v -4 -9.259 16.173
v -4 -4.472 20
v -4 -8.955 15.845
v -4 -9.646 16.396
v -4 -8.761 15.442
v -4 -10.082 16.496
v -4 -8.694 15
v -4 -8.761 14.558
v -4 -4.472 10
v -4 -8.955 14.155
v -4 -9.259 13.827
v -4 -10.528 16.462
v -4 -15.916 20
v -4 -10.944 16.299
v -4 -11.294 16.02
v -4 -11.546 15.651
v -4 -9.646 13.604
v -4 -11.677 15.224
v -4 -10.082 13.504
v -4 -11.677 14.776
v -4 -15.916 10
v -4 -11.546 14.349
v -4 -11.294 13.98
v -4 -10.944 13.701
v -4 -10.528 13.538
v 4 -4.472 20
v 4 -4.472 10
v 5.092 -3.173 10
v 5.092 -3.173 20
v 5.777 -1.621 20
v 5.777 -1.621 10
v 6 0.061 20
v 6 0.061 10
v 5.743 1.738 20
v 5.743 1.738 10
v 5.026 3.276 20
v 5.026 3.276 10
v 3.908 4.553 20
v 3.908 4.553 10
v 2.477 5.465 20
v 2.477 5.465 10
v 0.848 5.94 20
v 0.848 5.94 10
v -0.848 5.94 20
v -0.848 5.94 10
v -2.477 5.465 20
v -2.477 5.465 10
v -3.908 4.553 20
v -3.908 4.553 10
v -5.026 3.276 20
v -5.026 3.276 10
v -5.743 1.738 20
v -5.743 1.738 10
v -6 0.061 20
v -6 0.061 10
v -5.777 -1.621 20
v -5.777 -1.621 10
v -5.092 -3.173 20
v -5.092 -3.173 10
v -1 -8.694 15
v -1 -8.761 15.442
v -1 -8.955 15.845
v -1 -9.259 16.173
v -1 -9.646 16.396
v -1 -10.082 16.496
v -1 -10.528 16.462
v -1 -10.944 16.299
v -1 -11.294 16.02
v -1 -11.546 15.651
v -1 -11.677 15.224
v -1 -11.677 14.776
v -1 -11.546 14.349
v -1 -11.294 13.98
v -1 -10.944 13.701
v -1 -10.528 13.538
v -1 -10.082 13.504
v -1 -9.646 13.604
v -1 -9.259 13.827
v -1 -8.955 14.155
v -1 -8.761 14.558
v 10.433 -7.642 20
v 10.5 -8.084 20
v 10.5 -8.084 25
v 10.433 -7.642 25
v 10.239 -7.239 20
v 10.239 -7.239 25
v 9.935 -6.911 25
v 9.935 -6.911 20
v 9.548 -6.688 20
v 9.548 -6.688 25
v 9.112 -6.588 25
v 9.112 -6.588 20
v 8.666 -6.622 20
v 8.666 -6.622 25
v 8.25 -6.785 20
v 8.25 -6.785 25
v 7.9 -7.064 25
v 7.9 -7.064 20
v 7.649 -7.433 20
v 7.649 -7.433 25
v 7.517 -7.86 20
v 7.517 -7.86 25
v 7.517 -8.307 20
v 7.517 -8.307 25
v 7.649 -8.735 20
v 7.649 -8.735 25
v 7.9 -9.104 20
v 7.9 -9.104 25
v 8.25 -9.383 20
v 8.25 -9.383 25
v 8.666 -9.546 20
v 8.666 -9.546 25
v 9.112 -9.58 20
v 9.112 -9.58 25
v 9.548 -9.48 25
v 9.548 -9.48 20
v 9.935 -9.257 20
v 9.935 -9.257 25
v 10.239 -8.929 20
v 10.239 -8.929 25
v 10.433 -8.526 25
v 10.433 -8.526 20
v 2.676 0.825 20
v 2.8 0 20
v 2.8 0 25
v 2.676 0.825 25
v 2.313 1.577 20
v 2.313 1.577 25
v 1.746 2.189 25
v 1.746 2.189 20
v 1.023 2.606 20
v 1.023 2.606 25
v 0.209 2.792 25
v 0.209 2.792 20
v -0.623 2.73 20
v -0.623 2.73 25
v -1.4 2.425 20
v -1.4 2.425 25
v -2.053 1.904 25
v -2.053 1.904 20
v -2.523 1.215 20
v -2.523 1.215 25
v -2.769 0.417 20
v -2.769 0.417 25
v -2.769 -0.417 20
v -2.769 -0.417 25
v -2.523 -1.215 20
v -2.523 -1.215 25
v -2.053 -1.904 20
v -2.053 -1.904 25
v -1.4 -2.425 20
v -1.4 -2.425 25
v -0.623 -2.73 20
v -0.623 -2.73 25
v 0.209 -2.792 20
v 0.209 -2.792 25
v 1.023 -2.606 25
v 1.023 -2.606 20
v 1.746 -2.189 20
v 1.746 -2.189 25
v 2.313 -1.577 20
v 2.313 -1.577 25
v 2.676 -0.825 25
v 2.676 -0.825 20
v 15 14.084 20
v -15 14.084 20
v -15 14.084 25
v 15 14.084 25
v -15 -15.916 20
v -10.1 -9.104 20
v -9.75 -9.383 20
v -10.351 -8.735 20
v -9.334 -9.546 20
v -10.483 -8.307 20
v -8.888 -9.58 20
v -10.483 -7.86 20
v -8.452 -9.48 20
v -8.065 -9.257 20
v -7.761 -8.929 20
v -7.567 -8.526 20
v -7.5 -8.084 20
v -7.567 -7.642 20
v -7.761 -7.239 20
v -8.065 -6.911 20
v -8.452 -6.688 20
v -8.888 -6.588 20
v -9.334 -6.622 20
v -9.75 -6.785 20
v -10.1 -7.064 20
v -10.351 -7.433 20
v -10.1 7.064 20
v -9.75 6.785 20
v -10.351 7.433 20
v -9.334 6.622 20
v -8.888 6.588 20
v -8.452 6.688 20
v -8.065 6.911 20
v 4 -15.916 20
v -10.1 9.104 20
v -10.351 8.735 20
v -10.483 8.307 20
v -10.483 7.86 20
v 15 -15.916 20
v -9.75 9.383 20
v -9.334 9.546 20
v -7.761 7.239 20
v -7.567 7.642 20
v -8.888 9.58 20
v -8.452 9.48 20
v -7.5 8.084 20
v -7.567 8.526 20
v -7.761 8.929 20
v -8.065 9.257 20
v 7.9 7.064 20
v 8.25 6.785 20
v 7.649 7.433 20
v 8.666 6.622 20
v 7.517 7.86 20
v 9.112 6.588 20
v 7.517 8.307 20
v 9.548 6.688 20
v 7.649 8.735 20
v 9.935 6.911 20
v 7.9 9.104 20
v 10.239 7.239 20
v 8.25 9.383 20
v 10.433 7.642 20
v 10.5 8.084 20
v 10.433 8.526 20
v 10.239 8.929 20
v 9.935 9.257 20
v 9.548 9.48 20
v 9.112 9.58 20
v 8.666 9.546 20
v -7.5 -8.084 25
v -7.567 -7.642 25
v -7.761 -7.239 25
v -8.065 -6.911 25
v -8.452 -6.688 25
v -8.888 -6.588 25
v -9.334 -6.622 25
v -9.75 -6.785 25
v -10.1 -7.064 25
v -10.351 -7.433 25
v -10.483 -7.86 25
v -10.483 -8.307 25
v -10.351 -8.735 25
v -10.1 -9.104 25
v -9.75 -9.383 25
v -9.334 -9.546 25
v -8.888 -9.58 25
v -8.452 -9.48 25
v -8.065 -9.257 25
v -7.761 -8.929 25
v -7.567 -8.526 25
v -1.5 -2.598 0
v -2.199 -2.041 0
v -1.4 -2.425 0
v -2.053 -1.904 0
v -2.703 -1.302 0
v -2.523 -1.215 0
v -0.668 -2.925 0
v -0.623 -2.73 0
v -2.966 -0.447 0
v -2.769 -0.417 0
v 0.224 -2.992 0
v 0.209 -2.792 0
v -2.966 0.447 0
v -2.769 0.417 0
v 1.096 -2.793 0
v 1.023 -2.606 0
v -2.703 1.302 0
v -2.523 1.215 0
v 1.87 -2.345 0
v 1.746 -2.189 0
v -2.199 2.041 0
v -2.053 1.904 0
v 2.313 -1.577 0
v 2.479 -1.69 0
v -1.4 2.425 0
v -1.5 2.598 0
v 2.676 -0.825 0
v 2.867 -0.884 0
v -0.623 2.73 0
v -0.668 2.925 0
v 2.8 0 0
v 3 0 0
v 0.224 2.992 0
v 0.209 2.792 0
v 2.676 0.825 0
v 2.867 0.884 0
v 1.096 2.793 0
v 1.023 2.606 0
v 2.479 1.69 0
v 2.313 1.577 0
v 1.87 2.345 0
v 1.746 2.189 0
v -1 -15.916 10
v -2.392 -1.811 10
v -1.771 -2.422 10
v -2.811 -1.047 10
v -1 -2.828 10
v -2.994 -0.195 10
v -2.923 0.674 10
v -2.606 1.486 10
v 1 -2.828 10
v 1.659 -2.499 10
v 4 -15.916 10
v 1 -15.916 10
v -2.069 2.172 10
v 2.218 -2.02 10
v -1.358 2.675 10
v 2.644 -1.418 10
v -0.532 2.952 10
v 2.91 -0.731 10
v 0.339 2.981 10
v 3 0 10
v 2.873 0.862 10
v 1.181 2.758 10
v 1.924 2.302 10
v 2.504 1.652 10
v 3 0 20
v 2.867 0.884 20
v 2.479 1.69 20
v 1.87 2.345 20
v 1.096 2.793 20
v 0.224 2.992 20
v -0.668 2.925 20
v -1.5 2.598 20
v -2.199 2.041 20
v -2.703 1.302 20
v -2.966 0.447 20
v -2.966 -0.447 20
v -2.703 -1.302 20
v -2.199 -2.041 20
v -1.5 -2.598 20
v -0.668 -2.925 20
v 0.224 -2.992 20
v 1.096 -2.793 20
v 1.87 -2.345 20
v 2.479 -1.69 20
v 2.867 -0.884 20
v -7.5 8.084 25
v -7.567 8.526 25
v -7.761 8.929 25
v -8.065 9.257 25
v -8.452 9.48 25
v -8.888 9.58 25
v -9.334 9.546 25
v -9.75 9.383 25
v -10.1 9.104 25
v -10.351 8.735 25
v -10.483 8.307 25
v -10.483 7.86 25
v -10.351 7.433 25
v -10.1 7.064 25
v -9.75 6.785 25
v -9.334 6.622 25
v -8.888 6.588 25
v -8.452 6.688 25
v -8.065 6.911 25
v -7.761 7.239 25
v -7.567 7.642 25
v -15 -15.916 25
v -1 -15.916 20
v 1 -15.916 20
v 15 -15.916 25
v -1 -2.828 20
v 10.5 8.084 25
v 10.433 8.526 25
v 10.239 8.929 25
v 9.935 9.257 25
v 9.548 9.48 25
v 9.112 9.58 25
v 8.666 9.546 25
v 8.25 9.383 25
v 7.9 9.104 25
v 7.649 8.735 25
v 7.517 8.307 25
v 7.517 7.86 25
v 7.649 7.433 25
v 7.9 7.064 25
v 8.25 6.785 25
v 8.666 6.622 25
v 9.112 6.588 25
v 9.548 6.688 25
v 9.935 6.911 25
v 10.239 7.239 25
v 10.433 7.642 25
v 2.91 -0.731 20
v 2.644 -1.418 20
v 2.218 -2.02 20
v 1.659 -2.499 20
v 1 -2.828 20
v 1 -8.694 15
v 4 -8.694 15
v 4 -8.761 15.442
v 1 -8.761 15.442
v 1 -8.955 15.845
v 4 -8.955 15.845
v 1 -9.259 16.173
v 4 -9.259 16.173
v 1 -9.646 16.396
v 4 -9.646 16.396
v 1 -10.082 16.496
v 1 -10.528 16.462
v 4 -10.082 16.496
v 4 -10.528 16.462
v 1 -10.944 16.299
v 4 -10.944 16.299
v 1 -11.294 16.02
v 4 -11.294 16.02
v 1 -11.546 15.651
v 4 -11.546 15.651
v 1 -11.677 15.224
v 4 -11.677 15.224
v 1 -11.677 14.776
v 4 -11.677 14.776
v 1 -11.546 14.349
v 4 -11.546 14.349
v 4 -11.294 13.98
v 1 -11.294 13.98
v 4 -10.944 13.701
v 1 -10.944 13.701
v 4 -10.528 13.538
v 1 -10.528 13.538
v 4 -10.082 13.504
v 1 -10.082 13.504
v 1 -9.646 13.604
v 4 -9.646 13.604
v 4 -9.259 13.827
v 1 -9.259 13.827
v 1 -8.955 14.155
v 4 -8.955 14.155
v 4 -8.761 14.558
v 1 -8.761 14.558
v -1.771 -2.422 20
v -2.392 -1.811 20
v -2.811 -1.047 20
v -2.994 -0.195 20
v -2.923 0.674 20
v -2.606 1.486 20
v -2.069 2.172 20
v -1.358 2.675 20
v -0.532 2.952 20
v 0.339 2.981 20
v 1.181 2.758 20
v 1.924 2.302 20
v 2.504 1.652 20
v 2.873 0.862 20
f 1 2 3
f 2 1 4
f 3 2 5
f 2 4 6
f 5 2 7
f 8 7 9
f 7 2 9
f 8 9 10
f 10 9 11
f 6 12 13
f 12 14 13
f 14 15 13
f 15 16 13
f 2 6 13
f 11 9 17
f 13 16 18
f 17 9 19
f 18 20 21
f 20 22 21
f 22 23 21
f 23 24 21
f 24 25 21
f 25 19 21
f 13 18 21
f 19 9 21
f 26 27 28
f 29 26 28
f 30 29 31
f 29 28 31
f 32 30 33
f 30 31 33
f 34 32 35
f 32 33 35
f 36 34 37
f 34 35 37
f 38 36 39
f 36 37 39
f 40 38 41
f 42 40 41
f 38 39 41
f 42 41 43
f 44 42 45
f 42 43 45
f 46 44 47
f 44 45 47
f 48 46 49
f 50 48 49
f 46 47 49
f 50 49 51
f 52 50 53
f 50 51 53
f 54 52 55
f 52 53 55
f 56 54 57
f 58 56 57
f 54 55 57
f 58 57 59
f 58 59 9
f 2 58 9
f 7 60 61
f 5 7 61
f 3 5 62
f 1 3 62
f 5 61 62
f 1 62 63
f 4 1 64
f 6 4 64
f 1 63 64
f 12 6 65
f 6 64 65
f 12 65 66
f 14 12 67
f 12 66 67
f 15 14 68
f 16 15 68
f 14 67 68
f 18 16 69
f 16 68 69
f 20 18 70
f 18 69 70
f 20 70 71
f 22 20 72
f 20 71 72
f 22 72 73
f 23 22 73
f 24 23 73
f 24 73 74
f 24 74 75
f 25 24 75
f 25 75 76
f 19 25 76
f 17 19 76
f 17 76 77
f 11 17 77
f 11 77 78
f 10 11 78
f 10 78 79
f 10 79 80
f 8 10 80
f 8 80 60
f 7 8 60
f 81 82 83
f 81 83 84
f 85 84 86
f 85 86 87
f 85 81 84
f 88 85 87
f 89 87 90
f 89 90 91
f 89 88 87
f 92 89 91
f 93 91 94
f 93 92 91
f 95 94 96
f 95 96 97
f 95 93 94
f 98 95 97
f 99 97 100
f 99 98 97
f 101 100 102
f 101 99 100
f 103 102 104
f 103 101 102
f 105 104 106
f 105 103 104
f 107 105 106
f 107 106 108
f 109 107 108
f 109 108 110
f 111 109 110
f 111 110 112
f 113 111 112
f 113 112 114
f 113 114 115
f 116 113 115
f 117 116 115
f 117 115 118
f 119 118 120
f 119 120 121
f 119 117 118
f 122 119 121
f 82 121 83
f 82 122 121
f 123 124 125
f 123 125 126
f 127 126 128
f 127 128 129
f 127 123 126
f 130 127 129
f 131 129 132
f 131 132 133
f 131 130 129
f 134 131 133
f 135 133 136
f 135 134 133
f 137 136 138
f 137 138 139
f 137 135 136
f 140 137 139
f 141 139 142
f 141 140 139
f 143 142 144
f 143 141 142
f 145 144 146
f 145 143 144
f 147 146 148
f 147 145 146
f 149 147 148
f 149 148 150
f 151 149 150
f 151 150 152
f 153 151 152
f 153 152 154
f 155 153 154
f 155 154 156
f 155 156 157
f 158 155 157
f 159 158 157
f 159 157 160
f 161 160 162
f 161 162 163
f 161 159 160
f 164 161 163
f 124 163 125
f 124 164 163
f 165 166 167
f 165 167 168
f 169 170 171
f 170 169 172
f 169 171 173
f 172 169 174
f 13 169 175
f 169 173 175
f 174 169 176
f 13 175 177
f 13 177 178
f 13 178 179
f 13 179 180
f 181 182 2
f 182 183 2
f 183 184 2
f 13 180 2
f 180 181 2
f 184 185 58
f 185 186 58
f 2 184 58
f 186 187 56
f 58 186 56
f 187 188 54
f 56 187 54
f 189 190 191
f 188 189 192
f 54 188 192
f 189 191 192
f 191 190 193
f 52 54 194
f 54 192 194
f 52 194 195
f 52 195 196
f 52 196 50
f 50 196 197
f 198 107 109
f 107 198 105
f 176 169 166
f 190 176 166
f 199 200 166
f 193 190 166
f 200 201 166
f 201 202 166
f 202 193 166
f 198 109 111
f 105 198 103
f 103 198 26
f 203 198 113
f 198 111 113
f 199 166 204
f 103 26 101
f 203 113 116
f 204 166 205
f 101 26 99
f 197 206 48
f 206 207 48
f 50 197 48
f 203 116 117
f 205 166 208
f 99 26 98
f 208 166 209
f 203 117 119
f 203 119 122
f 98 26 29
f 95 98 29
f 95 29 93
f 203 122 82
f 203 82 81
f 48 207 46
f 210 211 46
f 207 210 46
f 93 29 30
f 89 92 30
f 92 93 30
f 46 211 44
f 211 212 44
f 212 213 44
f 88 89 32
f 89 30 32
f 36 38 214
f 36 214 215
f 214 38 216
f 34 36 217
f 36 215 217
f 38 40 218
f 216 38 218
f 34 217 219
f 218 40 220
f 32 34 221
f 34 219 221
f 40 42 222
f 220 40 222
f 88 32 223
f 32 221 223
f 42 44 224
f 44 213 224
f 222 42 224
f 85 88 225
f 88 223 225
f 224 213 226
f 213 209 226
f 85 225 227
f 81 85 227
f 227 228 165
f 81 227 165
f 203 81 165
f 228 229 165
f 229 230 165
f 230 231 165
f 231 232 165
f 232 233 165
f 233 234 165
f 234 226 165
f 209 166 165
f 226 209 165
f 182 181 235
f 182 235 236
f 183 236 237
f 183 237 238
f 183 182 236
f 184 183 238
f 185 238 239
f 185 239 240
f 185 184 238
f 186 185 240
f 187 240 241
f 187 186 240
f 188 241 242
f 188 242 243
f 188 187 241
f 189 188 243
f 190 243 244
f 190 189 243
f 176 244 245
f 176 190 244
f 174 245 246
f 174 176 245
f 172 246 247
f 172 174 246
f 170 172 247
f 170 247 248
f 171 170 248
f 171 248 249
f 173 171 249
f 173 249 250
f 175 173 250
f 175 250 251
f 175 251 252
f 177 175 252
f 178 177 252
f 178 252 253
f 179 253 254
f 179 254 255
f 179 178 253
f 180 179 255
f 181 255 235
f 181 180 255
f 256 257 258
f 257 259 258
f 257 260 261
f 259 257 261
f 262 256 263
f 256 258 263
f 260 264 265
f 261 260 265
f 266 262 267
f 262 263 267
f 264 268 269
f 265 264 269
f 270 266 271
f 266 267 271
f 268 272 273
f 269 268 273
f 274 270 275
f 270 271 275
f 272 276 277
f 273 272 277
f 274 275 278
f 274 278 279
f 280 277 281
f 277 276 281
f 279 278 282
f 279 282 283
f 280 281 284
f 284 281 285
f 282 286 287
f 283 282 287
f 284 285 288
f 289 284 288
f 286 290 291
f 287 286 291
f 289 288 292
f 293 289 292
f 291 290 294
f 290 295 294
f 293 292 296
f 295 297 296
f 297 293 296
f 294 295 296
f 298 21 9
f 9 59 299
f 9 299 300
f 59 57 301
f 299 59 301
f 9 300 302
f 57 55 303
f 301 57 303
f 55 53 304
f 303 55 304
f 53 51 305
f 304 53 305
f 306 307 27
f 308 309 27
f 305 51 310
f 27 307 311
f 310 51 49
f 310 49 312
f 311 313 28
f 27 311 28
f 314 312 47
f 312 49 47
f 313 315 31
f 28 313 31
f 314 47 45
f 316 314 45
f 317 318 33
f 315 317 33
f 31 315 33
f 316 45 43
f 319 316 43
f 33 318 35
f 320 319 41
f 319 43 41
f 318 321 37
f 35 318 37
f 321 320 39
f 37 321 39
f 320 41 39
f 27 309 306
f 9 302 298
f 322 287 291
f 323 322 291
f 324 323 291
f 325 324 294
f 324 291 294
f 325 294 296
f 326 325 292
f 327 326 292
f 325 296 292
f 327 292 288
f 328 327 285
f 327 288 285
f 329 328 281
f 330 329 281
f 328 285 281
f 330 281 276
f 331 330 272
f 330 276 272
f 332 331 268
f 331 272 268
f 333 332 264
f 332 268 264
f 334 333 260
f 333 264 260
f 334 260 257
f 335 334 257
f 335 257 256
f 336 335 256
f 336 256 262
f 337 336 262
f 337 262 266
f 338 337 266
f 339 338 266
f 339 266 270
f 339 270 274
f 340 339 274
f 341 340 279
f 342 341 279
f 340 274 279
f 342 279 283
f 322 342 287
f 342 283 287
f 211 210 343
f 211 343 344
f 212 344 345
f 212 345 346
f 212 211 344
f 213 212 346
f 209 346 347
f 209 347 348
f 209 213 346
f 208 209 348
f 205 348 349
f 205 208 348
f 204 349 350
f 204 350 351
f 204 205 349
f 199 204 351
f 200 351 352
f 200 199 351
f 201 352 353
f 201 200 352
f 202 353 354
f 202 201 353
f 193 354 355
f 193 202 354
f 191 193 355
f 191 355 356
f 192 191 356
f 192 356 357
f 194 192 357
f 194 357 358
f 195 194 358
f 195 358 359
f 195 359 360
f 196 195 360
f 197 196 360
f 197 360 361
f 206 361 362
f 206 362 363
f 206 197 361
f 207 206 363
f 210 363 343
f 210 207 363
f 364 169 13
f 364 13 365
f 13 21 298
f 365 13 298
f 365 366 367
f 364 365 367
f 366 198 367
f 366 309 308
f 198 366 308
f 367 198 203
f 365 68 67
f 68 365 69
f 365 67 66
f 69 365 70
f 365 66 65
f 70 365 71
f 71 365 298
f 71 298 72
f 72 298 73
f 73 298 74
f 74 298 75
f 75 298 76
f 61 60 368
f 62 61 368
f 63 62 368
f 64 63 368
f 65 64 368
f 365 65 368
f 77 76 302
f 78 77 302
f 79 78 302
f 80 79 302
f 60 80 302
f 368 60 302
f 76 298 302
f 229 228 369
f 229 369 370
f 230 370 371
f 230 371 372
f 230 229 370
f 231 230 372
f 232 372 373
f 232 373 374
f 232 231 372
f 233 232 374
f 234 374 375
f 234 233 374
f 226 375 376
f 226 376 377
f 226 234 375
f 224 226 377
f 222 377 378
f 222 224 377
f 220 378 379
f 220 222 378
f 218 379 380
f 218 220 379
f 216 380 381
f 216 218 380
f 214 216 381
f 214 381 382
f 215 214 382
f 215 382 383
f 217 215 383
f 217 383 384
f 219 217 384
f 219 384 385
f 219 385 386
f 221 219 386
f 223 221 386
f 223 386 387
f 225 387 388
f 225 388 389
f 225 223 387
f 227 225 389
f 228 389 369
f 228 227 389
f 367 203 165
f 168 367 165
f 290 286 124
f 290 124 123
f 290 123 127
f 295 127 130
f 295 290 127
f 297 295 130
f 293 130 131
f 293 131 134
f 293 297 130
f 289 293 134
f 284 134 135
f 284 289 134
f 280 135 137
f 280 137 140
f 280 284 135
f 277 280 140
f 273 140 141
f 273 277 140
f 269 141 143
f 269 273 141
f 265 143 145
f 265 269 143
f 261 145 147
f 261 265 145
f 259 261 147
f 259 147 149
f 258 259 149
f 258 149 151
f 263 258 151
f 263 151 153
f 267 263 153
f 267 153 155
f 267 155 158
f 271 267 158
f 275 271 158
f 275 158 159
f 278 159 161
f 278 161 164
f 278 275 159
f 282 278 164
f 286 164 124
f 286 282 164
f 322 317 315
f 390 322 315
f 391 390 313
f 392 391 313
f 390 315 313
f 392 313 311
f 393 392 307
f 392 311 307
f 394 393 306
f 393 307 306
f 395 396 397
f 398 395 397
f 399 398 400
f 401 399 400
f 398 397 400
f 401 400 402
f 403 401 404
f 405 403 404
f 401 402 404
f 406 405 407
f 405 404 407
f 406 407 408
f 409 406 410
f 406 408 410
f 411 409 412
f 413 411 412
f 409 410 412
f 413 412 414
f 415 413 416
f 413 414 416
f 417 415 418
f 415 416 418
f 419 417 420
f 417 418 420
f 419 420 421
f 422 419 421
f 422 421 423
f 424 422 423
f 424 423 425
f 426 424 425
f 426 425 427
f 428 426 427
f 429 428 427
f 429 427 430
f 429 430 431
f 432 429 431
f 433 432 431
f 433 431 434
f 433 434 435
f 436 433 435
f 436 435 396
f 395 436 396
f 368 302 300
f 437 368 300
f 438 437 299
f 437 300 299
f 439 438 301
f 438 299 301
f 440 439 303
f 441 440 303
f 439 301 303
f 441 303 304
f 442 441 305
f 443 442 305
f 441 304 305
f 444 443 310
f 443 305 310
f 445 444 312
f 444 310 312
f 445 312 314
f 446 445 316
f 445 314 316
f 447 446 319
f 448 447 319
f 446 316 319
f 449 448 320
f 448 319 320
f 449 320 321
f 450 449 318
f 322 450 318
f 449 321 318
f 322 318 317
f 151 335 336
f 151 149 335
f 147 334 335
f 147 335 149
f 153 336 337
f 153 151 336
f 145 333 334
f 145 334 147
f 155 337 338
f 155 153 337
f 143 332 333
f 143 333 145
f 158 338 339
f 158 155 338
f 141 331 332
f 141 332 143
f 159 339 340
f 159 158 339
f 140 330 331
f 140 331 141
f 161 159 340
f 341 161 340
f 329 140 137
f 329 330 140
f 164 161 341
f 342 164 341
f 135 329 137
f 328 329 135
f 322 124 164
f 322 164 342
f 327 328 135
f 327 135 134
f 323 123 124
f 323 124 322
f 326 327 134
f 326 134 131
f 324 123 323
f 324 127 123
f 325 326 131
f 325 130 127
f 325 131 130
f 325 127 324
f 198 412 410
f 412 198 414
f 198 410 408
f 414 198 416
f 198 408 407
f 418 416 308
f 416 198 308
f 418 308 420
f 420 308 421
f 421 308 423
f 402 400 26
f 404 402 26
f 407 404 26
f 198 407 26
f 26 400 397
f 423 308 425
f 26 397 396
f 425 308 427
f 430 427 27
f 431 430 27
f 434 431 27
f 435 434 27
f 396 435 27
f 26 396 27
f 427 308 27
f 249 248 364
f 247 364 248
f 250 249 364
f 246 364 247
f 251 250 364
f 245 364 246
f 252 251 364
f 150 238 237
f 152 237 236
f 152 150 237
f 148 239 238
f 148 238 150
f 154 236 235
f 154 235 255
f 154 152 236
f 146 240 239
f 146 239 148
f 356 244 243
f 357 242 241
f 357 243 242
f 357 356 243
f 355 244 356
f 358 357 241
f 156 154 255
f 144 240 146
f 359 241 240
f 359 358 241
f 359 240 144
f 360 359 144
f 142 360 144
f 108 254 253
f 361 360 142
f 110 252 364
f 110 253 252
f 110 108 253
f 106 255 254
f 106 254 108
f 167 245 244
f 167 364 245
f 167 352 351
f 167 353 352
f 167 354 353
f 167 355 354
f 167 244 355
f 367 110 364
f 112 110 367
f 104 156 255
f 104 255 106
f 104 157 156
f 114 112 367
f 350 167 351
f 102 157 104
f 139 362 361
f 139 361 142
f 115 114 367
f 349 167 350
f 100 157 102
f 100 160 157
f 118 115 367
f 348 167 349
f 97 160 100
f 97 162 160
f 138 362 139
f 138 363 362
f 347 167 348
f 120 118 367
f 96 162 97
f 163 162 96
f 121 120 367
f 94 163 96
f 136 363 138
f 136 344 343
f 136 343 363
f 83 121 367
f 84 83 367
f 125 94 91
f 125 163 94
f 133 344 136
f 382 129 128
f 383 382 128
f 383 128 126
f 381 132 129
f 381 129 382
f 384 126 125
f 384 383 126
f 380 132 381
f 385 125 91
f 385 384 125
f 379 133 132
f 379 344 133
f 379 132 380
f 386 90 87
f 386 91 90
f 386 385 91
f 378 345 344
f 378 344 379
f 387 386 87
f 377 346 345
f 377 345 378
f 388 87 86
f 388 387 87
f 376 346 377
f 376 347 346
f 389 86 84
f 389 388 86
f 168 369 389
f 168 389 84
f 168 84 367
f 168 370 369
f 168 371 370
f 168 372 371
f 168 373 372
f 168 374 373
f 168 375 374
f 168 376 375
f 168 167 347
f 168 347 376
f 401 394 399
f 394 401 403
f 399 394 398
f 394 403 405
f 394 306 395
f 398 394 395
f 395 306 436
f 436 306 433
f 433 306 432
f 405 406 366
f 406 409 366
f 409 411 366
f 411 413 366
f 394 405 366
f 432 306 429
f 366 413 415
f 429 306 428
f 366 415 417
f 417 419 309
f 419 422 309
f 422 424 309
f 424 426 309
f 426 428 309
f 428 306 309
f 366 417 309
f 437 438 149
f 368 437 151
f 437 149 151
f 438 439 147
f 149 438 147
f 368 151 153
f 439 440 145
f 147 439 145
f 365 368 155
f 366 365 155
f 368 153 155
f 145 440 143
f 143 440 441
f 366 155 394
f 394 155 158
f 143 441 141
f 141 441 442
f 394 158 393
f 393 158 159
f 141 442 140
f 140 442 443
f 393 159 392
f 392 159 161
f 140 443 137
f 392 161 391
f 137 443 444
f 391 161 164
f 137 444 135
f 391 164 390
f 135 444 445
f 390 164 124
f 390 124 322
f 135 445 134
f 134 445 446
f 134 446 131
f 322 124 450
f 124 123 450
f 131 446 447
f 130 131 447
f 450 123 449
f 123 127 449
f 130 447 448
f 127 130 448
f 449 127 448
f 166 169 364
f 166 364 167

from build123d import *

# Parameters (mm, degrees)
F0_R     = 3
F0_R_2   = 2.8
F1_DEPTH = 20
F4_DEPTH = 10
F5_R     = 1.5
F6_DEPTH = 10.001
F7_W     = 30
F7_H     = 30
F7_R     = 1.5
F7_R_2   = 2.8
F8_DEPTH = 5


with BuildPart() as f1:
    # F0 (on Top) → F1 (new body)
    with BuildSketch(Plane.XY):
        Circle(F0_R)
        Circle(F0_R_2, mode=Mode.SUBTRACT)
    extrude(amount=F1_DEPTH)


with BuildPart() as f4:
    # F3 (on offset) → F4 (new body)
    with BuildSketch(Plane.XY.offset(10)):
        with BuildLine():
            ThreePointArc((-1, -2.8284271247), (-1.7320508076, 2.4494897428), (3, 0))
            ThreePointArc((3, 0), (2.4494897428, -1.7320508076), (1, -2.8284271247))
            Line((1, -2.8284271247), (1, -5.9160797831))
            Line((1, -5.9160797831), (1, -15.9160797831))
            Line((1, -15.9160797831), (4, -15.9160797831))
            Line((4, -15.9160797831), (4, -4.472135955))
            ThreePointArc((4, -4.472135955), (0, 6), (-4, -4.472135955))
            Line((-4, -4.472135955), (-4, -15.9160797831))
            Line((-4, -15.9160797831), (-1, -15.9160797831))
            Line((-1, -15.9160797831), (-1, -5.9160797831))
            Line((-1, -5.9160797831), (-1, -2.8284271247))
        make_face()
    extrude(amount=F4_DEPTH)

    # F5 (on face) → F6 (cut, through all)
    with BuildSketch(Plane.YZ.offset(4)):
        with Locations((-10.194107869, 15)):
            Circle(F5_R)
    extrude(amount=-F6_DEPTH, mode=Mode.SUBTRACT)

    # F7 (on face) → F8 (join)
    with BuildSketch(Plane.XY.offset(20)):
        with Locations((0, -0.9160797831)):
            Rectangle(F7_W, F7_H)
        with Locations((-9, -8.0839202169)):
            Circle(F7_R, mode=Mode.SUBTRACT)
        with Locations((9, -8.0839202169)):
            Circle(F7_R, mode=Mode.SUBTRACT)
        with Locations((-9, 8.0839202169)):
            Circle(F7_R, mode=Mode.SUBTRACT)
        Circle(F7_R_2, mode=Mode.SUBTRACT)
        with Locations((9, 8.0839202169)):
            Circle(F7_R, mode=Mode.SUBTRACT)
    extrude(amount=F8_DEPTH)


solid = Compound([f1.part, f4.part])
